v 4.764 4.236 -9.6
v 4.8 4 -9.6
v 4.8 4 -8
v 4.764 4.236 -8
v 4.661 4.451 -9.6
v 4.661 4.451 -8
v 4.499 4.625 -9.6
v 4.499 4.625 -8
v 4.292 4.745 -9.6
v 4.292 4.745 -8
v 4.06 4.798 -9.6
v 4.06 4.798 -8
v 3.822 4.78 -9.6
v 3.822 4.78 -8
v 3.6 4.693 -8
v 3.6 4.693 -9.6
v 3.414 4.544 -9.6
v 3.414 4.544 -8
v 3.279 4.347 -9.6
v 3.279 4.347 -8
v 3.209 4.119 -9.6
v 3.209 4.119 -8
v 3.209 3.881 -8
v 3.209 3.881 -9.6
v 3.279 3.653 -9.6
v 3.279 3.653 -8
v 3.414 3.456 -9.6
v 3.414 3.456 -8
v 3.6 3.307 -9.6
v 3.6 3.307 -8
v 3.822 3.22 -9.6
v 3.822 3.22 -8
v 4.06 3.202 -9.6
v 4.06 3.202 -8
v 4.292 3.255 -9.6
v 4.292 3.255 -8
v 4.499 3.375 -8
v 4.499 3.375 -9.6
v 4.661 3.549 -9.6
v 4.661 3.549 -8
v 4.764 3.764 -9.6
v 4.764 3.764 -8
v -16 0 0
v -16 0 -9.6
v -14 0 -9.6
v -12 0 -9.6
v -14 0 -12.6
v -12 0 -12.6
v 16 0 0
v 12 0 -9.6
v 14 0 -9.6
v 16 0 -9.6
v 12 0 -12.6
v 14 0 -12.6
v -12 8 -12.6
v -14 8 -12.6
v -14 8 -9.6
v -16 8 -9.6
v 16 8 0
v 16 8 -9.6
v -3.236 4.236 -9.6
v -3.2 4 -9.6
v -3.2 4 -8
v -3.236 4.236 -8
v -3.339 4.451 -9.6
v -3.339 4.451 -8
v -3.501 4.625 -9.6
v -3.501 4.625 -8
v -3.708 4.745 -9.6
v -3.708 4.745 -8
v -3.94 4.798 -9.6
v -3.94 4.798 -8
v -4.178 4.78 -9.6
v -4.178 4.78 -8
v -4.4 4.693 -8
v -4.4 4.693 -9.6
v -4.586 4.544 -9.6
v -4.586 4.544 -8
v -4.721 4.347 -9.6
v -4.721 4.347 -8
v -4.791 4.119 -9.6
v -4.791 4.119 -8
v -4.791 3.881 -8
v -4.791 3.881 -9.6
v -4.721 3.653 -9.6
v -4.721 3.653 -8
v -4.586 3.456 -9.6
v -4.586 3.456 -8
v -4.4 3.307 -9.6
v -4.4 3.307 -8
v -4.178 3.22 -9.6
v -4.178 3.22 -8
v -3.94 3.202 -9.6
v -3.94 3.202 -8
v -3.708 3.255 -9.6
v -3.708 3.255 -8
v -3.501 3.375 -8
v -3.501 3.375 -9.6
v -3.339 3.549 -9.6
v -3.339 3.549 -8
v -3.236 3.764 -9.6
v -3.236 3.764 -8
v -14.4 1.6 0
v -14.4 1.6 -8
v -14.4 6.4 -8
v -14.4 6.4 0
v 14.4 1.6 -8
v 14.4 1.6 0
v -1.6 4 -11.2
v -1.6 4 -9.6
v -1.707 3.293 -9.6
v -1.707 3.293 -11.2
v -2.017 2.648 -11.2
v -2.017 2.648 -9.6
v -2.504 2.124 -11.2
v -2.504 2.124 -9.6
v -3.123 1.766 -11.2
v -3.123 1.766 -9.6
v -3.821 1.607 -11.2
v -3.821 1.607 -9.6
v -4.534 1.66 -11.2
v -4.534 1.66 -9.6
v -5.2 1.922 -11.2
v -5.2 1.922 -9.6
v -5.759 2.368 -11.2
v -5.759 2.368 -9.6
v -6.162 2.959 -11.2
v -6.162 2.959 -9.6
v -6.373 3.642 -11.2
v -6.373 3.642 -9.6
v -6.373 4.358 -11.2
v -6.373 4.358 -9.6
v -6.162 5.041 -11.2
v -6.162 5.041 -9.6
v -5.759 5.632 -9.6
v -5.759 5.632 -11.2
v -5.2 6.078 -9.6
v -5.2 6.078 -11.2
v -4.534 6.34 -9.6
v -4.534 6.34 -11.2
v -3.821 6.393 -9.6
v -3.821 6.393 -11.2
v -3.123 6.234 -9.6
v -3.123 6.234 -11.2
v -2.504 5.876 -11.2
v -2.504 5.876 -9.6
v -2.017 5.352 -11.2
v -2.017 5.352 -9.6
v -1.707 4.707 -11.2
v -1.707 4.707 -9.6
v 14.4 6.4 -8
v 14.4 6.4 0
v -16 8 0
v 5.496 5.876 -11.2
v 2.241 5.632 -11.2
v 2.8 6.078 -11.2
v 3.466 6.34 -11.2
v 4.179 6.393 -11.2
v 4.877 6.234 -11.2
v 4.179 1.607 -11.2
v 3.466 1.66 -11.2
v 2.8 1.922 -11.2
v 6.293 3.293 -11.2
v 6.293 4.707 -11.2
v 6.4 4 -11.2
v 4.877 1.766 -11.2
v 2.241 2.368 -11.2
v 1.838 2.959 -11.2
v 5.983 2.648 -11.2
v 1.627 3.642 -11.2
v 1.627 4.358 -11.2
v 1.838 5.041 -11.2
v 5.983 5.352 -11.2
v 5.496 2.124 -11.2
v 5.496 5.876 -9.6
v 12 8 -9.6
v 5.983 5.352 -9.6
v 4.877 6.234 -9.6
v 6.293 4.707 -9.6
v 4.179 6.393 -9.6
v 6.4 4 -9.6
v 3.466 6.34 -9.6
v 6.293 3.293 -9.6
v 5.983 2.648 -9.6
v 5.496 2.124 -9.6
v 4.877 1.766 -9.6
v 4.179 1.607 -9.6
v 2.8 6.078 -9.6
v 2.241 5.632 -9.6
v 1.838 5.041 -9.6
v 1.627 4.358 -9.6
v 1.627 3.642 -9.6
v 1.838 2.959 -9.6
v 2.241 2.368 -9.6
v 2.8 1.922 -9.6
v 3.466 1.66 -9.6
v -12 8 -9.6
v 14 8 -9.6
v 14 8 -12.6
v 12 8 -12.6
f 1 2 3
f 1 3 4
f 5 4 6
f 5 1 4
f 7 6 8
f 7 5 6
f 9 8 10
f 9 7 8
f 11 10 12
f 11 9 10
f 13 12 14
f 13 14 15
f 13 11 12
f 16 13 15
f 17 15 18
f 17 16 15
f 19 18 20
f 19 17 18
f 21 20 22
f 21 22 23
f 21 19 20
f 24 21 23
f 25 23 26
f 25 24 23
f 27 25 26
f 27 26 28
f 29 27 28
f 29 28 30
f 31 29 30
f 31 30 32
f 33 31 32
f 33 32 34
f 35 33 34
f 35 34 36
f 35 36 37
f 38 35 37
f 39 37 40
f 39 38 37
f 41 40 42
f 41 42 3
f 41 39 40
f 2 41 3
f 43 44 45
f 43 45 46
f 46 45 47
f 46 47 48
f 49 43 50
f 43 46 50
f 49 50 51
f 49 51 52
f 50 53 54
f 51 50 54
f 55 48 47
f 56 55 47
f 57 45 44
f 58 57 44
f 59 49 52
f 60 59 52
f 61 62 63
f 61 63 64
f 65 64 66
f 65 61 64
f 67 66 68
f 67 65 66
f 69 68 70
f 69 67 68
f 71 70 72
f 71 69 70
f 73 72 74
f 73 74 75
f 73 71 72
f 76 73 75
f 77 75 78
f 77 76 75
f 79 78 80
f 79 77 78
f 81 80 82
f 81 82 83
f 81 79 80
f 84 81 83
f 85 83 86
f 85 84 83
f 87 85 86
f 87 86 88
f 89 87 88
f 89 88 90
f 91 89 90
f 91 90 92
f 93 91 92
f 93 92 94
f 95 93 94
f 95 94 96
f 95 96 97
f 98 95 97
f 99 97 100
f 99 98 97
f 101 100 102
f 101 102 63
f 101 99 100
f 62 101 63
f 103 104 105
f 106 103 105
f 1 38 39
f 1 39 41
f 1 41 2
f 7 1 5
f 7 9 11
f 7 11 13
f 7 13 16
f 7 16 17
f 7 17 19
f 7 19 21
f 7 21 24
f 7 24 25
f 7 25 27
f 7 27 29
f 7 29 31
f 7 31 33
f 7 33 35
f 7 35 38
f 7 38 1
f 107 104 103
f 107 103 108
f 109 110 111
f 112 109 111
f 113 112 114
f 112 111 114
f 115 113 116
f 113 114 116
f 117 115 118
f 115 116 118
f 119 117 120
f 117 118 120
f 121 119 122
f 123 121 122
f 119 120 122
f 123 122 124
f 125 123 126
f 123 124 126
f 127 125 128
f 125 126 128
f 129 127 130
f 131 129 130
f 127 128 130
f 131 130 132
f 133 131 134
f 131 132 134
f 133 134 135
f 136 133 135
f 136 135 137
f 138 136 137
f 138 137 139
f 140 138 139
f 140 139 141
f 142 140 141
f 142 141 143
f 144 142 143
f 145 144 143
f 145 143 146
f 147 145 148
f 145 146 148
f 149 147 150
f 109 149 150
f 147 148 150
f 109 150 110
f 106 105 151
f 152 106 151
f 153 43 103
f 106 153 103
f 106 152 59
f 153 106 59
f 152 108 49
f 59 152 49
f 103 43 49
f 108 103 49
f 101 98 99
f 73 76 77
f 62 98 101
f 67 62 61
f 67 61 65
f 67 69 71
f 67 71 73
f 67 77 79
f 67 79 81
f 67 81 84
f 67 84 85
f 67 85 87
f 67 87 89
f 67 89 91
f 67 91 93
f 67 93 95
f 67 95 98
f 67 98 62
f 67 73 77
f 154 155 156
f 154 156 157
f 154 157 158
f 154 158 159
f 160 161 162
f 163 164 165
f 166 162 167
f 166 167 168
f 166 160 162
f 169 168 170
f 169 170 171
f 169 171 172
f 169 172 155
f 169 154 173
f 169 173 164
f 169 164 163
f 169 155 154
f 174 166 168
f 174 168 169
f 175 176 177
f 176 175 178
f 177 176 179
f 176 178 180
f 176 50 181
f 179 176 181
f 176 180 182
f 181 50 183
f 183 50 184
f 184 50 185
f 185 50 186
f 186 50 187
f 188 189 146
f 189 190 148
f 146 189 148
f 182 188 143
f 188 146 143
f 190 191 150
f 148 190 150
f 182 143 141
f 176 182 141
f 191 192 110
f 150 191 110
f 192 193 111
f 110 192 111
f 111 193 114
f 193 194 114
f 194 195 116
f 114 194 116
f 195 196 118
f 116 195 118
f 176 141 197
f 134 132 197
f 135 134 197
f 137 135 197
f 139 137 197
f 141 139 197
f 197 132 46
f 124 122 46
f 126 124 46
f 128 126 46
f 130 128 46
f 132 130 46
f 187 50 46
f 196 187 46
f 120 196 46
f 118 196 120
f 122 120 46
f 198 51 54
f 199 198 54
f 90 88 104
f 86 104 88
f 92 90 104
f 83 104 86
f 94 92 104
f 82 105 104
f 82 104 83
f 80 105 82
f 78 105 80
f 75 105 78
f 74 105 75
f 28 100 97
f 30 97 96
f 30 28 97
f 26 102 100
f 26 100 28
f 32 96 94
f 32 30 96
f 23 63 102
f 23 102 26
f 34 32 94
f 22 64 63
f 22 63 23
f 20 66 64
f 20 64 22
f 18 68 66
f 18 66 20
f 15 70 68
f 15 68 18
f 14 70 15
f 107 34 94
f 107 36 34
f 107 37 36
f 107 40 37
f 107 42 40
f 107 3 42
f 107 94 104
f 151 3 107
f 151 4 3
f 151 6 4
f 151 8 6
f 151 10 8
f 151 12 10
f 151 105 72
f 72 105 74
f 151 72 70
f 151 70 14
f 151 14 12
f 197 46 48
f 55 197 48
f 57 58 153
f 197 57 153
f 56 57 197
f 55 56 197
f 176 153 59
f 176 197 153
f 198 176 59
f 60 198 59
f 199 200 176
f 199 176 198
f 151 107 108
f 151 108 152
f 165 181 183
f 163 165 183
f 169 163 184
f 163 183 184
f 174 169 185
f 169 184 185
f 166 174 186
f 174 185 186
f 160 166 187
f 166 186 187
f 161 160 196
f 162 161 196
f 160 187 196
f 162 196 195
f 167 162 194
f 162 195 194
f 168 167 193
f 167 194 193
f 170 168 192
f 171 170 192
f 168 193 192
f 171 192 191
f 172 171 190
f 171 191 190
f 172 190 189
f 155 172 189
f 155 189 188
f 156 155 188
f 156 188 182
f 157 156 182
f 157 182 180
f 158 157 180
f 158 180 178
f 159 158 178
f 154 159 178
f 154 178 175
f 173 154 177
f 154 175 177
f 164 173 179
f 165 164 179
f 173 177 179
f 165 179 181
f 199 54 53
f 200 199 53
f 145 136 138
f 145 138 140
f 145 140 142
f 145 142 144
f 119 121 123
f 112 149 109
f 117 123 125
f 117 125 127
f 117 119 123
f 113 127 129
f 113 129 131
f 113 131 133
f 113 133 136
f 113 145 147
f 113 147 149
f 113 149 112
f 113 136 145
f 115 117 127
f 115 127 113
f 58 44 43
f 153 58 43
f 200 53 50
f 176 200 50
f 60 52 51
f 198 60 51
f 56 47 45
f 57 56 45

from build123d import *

# Parameters (mm, degrees)
BOSS_EXTRUDE1_DEPTH = 8
SKETCH2_R           = 2.4
BOSS_EXTRUDE2_DEPTH = 1.6
SHELL1_START        = -8
SHELL1_OUTLINE_W    = 28.8
SHELL1_OUTLINE_H    = 4.8
SHELL1_DEPTH        = 8
SHELL1_START_2      = -9.6
SHELL1_2_OUTLINE_R  = 0.8
SHELL1_2_DEPTH      = 1.6


# Read off the part's stored shape, not the designer's step: Shell1
with BuildPart() as part:
    # Sketch1 → Boss-Extrude1 (new body)
    with BuildSketch(Plane(origin=(0, 0, 0), x_dir=(1, 0, 0), z_dir=(0, 1, 0))):
        Polygon((-16, 0), (16, 0), (16, 9.6), (14, 9.6), (14, 12.6), (12, 12.6), (12, 9.6), (-12, 9.6), (-12, 12.6), (-14, 12.6), (-14, 9.6), (-16, 9.6), align=None)
    extrude(amount=BOSS_EXTRUDE1_DEPTH)

    # Sketch2 → Boss-Extrude2 (add)
    with BuildSketch(Plane(origin=(0, 0, -9.6), x_dir=(-1, 0, 0), z_dir=(0, 0, -1))):
        with Locations(Location((4, 4, 0), (0, 0, 180))):
            Circle(SKETCH2_R)
        with Locations(Location((-4, 4, 0), (0, 0, 180))):
            Circle(SKETCH2_R)
    extrude(amount=BOSS_EXTRUDE2_DEPTH)

    # Shell1 outline → Shell1 (cut)
    with BuildSketch(Plane.XY.offset(SHELL1_START)):
        with Locations((0, 4)):
            Rectangle(SHELL1_OUTLINE_W, SHELL1_OUTLINE_H)
    extrude(amount=SHELL1_DEPTH, mode=Mode.SUBTRACT)

    # Shell1 2 outline → Shell1 2 (cut)
    with BuildSketch(Plane.XY.offset(SHELL1_START_2)):
        with Locations((-4, 4)):
            Circle(SHELL1_2_OUTLINE_R)
        with Locations((4, 4)):
            Circle(SHELL1_2_OUTLINE_R)
    extrude(amount=SHELL1_2_DEPTH, mode=Mode.SUBTRACT)


solid = part.part
